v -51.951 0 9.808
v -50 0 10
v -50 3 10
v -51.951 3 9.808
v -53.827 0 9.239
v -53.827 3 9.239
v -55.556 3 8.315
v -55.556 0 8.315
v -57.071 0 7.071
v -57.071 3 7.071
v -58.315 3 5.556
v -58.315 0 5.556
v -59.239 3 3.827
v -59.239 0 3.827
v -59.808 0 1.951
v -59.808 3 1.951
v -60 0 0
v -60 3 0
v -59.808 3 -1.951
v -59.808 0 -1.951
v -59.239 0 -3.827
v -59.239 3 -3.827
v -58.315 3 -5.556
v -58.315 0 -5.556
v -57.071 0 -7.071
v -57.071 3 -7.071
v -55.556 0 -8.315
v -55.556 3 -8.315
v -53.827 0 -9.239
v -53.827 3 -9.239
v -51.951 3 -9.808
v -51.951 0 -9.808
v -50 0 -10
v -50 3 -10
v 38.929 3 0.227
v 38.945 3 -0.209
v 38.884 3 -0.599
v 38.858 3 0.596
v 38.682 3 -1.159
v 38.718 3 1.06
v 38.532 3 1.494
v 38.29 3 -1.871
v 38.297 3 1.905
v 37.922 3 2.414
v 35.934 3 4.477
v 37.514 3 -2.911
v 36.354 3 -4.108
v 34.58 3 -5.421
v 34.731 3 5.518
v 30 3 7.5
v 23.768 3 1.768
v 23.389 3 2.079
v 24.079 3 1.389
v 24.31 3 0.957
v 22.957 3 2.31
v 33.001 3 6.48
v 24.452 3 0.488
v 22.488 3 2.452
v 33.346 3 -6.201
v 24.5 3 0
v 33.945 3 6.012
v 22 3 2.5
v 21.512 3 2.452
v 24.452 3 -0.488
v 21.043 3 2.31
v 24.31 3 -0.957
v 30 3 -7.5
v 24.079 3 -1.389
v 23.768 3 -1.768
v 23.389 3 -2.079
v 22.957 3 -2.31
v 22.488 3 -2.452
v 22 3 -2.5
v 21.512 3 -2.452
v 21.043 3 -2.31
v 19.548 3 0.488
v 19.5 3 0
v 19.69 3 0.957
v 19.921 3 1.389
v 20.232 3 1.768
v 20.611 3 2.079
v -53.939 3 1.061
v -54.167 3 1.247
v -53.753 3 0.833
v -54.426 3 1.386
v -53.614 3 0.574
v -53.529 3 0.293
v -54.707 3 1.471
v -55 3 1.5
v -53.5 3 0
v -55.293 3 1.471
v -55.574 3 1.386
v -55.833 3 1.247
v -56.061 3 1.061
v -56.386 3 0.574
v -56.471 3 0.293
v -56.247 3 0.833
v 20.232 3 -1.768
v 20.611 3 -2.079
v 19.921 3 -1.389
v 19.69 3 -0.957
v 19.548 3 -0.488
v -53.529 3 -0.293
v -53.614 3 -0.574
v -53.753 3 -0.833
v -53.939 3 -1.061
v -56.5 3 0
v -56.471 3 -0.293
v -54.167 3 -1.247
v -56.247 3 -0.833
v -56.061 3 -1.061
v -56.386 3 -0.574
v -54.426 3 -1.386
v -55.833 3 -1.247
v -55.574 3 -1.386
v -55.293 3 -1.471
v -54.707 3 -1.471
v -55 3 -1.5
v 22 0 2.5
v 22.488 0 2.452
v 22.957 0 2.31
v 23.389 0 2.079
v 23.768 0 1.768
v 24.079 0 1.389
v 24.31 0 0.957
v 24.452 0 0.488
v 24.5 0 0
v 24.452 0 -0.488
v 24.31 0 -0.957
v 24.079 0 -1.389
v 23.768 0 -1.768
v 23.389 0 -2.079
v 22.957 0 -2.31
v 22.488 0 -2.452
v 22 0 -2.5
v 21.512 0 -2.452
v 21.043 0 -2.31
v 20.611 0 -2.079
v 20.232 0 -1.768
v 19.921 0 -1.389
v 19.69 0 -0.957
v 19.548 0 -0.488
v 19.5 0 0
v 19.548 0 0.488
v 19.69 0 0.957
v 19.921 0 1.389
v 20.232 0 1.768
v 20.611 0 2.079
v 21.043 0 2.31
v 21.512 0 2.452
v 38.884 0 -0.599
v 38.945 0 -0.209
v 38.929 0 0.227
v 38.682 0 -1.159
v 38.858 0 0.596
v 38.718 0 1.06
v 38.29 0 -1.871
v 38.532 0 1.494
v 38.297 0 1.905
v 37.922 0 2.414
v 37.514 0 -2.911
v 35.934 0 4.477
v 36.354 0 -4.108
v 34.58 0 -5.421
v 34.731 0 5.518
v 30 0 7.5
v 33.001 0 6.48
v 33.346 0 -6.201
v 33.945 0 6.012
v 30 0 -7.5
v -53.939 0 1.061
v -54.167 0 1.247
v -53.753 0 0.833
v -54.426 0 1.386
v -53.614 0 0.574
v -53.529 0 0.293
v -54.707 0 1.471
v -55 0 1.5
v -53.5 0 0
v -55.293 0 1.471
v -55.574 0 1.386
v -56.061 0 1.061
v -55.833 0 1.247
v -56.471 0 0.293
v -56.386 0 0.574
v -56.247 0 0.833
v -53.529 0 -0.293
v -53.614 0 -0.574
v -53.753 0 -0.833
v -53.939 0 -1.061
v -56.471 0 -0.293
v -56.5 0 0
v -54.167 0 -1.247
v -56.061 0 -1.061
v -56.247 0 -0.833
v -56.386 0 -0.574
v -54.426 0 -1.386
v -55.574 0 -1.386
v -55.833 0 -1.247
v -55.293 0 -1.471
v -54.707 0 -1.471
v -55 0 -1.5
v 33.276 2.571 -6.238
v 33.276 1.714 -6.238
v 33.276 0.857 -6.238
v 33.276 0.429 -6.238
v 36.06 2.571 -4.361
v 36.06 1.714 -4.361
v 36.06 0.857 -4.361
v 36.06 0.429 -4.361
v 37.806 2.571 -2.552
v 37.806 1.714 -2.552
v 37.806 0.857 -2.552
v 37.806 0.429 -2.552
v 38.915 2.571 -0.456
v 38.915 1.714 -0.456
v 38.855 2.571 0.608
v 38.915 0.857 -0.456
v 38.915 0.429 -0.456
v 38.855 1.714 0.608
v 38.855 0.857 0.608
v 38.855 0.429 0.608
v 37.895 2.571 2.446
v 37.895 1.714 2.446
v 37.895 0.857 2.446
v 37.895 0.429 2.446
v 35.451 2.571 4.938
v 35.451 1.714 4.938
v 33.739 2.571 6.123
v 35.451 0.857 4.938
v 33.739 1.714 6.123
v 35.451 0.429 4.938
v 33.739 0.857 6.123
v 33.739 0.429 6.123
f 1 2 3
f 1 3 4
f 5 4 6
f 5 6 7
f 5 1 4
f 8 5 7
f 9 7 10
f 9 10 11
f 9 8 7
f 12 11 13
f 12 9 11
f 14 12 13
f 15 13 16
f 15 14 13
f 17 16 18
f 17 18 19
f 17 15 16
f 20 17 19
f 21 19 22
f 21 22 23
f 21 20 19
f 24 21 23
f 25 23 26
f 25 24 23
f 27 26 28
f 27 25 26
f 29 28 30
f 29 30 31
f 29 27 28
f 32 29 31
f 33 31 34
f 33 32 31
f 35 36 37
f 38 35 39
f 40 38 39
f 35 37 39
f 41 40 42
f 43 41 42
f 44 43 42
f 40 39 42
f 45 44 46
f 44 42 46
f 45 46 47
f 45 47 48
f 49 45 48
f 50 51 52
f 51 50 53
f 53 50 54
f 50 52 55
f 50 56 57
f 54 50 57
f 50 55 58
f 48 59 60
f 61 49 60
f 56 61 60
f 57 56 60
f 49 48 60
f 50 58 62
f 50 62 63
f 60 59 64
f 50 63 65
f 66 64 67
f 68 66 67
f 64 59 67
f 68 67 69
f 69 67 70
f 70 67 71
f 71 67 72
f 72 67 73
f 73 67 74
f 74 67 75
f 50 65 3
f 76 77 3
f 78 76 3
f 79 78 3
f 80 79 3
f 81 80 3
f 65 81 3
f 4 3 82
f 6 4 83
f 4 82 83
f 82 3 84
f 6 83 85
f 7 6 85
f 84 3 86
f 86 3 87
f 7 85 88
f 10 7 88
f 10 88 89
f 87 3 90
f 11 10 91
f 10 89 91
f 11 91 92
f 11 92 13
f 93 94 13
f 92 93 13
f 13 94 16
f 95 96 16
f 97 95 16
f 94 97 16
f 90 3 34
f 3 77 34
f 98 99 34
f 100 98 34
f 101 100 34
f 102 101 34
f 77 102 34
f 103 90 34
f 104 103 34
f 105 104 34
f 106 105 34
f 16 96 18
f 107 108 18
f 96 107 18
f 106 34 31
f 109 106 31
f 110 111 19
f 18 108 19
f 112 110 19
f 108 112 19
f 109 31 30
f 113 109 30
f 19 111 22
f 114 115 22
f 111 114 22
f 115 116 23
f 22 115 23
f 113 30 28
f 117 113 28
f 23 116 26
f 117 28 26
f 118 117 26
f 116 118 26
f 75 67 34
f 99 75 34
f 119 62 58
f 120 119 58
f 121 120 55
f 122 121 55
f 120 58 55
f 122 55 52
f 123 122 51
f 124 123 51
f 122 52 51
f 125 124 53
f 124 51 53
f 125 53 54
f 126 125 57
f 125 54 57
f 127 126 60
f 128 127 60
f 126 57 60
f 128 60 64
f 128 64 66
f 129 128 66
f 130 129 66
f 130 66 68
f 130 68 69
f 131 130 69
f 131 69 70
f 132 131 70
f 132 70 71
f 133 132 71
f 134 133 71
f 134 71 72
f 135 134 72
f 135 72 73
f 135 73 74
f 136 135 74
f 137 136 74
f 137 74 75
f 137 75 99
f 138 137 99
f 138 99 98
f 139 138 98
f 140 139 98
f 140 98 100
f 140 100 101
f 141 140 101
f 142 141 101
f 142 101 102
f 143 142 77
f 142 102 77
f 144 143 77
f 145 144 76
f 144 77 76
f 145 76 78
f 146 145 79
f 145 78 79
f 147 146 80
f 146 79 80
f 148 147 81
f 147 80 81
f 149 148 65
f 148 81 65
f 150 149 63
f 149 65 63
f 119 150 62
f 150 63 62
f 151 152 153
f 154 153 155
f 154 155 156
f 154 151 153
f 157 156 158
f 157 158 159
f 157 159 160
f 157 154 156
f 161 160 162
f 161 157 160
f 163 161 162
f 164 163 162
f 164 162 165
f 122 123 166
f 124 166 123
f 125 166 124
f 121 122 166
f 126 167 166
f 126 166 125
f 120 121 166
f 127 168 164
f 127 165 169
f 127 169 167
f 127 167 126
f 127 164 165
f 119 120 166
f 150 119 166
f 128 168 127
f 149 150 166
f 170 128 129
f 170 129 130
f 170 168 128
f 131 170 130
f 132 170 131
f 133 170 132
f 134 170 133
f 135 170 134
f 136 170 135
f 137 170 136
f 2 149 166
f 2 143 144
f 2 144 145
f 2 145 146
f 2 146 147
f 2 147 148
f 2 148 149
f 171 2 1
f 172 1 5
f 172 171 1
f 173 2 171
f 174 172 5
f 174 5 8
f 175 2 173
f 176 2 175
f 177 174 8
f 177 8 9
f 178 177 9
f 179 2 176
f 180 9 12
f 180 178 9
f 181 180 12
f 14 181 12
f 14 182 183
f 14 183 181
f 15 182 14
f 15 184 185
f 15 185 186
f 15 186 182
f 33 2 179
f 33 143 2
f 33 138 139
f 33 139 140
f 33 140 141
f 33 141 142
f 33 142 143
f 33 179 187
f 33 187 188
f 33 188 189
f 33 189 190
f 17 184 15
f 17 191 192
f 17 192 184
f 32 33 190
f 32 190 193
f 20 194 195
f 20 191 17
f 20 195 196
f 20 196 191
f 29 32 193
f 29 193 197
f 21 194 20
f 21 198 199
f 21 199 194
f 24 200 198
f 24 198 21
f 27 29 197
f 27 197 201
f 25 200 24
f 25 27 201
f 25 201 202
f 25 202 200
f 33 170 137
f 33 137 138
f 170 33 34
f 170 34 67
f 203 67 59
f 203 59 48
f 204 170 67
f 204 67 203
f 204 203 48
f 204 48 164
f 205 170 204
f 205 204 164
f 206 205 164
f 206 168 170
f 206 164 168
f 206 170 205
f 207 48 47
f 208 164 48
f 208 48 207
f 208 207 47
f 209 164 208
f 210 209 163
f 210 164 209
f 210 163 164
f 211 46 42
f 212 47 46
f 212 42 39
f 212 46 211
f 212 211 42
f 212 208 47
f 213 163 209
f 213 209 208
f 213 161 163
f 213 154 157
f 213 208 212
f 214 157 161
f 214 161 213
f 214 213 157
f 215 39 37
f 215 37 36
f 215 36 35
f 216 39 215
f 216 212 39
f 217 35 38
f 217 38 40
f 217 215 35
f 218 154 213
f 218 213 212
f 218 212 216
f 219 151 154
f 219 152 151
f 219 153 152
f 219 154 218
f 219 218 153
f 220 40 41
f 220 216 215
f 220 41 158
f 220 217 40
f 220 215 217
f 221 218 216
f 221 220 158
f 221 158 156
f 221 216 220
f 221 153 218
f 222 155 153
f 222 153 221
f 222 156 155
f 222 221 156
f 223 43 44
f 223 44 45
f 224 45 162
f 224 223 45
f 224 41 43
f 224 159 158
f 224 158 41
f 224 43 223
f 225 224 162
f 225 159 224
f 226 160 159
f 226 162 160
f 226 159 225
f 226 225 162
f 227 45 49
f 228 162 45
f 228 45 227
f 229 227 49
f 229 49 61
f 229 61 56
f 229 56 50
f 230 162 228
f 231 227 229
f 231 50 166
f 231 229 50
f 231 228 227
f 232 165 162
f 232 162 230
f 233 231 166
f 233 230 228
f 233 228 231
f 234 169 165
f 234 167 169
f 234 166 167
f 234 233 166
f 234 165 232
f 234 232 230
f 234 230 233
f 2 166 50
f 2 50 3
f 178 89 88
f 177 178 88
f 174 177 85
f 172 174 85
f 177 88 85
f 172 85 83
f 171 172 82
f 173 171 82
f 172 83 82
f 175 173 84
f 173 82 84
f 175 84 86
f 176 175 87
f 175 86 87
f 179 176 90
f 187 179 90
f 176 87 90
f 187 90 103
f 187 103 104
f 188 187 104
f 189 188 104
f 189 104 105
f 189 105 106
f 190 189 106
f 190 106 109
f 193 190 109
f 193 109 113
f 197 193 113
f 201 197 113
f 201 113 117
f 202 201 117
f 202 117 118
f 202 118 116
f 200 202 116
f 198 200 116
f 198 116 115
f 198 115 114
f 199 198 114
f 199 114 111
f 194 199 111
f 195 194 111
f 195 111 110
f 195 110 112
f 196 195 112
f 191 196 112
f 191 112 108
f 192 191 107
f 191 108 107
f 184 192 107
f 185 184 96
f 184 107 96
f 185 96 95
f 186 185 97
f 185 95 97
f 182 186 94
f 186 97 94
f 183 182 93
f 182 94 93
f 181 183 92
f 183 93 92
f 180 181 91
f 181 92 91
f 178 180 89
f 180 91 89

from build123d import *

# Parameters (mm, degrees)
ESTRUSIONE_ESTRUSIONE1_DEPTH = 3
SCHIZZO2_R                   = 2.5
SCHIZZO2_R_2                 = 1.5
TAGLIO_ESTRUSIONE1_DEPTH     = 4


with BuildPart() as part:
    # Schizzo1 → Estrusione-Estrusione1 (new body)
    with BuildSketch(Plane(origin=(0, 0, 0), x_dir=(1, 0, 0), z_dir=(0, 1, 0))):
        with BuildLine():
            Line((-50, 10), (30, 7.5))
            add(Edge.make_bspline(
                [(30, 7.5), (33.261716858, 6.481496625), (33.844483216, 5.888387677), (36.662246593, 4.013349049), (39.160928363, 1.186216806), (38.675315874, -1.975639526), (37.390186483, -2.924572182), (35.347677145, -5.108790593), (33.432549191, -6.590635505), (30, -7.5)],
                knots=[0, 0, 0, 0, 0.303835535, 0.360141123, 0.540509801, 0.596736192, 0.866178642, 0.909873054, 1, 1, 1, 1], degree=3))
            Line((30, -7.5), (-50, -10))
            ThreePointArc((-50, -10), (-60, 0), (-50, 10))
        make_face()
    extrude(amount=ESTRUSIONE_ESTRUSIONE1_DEPTH)

    # Schizzo2 → Taglio-Estrusione1 (cut)
    with BuildSketch(Plane(origin=(0, 3, 0), x_dir=(1, 0, 0), z_dir=(0, 1, 0))):
        with Locations(Location((22, 0, 0), (0, 0, 270))):
            Circle(SCHIZZO2_R)
        with Locations(Location((-55, 0, 0), (0, 0, 270))):
            Circle(SCHIZZO2_R_2)
    extrude(amount=-TAGLIO_ESTRUSIONE1_DEPTH, mode=Mode.SUBTRACT)


solid = part.part
